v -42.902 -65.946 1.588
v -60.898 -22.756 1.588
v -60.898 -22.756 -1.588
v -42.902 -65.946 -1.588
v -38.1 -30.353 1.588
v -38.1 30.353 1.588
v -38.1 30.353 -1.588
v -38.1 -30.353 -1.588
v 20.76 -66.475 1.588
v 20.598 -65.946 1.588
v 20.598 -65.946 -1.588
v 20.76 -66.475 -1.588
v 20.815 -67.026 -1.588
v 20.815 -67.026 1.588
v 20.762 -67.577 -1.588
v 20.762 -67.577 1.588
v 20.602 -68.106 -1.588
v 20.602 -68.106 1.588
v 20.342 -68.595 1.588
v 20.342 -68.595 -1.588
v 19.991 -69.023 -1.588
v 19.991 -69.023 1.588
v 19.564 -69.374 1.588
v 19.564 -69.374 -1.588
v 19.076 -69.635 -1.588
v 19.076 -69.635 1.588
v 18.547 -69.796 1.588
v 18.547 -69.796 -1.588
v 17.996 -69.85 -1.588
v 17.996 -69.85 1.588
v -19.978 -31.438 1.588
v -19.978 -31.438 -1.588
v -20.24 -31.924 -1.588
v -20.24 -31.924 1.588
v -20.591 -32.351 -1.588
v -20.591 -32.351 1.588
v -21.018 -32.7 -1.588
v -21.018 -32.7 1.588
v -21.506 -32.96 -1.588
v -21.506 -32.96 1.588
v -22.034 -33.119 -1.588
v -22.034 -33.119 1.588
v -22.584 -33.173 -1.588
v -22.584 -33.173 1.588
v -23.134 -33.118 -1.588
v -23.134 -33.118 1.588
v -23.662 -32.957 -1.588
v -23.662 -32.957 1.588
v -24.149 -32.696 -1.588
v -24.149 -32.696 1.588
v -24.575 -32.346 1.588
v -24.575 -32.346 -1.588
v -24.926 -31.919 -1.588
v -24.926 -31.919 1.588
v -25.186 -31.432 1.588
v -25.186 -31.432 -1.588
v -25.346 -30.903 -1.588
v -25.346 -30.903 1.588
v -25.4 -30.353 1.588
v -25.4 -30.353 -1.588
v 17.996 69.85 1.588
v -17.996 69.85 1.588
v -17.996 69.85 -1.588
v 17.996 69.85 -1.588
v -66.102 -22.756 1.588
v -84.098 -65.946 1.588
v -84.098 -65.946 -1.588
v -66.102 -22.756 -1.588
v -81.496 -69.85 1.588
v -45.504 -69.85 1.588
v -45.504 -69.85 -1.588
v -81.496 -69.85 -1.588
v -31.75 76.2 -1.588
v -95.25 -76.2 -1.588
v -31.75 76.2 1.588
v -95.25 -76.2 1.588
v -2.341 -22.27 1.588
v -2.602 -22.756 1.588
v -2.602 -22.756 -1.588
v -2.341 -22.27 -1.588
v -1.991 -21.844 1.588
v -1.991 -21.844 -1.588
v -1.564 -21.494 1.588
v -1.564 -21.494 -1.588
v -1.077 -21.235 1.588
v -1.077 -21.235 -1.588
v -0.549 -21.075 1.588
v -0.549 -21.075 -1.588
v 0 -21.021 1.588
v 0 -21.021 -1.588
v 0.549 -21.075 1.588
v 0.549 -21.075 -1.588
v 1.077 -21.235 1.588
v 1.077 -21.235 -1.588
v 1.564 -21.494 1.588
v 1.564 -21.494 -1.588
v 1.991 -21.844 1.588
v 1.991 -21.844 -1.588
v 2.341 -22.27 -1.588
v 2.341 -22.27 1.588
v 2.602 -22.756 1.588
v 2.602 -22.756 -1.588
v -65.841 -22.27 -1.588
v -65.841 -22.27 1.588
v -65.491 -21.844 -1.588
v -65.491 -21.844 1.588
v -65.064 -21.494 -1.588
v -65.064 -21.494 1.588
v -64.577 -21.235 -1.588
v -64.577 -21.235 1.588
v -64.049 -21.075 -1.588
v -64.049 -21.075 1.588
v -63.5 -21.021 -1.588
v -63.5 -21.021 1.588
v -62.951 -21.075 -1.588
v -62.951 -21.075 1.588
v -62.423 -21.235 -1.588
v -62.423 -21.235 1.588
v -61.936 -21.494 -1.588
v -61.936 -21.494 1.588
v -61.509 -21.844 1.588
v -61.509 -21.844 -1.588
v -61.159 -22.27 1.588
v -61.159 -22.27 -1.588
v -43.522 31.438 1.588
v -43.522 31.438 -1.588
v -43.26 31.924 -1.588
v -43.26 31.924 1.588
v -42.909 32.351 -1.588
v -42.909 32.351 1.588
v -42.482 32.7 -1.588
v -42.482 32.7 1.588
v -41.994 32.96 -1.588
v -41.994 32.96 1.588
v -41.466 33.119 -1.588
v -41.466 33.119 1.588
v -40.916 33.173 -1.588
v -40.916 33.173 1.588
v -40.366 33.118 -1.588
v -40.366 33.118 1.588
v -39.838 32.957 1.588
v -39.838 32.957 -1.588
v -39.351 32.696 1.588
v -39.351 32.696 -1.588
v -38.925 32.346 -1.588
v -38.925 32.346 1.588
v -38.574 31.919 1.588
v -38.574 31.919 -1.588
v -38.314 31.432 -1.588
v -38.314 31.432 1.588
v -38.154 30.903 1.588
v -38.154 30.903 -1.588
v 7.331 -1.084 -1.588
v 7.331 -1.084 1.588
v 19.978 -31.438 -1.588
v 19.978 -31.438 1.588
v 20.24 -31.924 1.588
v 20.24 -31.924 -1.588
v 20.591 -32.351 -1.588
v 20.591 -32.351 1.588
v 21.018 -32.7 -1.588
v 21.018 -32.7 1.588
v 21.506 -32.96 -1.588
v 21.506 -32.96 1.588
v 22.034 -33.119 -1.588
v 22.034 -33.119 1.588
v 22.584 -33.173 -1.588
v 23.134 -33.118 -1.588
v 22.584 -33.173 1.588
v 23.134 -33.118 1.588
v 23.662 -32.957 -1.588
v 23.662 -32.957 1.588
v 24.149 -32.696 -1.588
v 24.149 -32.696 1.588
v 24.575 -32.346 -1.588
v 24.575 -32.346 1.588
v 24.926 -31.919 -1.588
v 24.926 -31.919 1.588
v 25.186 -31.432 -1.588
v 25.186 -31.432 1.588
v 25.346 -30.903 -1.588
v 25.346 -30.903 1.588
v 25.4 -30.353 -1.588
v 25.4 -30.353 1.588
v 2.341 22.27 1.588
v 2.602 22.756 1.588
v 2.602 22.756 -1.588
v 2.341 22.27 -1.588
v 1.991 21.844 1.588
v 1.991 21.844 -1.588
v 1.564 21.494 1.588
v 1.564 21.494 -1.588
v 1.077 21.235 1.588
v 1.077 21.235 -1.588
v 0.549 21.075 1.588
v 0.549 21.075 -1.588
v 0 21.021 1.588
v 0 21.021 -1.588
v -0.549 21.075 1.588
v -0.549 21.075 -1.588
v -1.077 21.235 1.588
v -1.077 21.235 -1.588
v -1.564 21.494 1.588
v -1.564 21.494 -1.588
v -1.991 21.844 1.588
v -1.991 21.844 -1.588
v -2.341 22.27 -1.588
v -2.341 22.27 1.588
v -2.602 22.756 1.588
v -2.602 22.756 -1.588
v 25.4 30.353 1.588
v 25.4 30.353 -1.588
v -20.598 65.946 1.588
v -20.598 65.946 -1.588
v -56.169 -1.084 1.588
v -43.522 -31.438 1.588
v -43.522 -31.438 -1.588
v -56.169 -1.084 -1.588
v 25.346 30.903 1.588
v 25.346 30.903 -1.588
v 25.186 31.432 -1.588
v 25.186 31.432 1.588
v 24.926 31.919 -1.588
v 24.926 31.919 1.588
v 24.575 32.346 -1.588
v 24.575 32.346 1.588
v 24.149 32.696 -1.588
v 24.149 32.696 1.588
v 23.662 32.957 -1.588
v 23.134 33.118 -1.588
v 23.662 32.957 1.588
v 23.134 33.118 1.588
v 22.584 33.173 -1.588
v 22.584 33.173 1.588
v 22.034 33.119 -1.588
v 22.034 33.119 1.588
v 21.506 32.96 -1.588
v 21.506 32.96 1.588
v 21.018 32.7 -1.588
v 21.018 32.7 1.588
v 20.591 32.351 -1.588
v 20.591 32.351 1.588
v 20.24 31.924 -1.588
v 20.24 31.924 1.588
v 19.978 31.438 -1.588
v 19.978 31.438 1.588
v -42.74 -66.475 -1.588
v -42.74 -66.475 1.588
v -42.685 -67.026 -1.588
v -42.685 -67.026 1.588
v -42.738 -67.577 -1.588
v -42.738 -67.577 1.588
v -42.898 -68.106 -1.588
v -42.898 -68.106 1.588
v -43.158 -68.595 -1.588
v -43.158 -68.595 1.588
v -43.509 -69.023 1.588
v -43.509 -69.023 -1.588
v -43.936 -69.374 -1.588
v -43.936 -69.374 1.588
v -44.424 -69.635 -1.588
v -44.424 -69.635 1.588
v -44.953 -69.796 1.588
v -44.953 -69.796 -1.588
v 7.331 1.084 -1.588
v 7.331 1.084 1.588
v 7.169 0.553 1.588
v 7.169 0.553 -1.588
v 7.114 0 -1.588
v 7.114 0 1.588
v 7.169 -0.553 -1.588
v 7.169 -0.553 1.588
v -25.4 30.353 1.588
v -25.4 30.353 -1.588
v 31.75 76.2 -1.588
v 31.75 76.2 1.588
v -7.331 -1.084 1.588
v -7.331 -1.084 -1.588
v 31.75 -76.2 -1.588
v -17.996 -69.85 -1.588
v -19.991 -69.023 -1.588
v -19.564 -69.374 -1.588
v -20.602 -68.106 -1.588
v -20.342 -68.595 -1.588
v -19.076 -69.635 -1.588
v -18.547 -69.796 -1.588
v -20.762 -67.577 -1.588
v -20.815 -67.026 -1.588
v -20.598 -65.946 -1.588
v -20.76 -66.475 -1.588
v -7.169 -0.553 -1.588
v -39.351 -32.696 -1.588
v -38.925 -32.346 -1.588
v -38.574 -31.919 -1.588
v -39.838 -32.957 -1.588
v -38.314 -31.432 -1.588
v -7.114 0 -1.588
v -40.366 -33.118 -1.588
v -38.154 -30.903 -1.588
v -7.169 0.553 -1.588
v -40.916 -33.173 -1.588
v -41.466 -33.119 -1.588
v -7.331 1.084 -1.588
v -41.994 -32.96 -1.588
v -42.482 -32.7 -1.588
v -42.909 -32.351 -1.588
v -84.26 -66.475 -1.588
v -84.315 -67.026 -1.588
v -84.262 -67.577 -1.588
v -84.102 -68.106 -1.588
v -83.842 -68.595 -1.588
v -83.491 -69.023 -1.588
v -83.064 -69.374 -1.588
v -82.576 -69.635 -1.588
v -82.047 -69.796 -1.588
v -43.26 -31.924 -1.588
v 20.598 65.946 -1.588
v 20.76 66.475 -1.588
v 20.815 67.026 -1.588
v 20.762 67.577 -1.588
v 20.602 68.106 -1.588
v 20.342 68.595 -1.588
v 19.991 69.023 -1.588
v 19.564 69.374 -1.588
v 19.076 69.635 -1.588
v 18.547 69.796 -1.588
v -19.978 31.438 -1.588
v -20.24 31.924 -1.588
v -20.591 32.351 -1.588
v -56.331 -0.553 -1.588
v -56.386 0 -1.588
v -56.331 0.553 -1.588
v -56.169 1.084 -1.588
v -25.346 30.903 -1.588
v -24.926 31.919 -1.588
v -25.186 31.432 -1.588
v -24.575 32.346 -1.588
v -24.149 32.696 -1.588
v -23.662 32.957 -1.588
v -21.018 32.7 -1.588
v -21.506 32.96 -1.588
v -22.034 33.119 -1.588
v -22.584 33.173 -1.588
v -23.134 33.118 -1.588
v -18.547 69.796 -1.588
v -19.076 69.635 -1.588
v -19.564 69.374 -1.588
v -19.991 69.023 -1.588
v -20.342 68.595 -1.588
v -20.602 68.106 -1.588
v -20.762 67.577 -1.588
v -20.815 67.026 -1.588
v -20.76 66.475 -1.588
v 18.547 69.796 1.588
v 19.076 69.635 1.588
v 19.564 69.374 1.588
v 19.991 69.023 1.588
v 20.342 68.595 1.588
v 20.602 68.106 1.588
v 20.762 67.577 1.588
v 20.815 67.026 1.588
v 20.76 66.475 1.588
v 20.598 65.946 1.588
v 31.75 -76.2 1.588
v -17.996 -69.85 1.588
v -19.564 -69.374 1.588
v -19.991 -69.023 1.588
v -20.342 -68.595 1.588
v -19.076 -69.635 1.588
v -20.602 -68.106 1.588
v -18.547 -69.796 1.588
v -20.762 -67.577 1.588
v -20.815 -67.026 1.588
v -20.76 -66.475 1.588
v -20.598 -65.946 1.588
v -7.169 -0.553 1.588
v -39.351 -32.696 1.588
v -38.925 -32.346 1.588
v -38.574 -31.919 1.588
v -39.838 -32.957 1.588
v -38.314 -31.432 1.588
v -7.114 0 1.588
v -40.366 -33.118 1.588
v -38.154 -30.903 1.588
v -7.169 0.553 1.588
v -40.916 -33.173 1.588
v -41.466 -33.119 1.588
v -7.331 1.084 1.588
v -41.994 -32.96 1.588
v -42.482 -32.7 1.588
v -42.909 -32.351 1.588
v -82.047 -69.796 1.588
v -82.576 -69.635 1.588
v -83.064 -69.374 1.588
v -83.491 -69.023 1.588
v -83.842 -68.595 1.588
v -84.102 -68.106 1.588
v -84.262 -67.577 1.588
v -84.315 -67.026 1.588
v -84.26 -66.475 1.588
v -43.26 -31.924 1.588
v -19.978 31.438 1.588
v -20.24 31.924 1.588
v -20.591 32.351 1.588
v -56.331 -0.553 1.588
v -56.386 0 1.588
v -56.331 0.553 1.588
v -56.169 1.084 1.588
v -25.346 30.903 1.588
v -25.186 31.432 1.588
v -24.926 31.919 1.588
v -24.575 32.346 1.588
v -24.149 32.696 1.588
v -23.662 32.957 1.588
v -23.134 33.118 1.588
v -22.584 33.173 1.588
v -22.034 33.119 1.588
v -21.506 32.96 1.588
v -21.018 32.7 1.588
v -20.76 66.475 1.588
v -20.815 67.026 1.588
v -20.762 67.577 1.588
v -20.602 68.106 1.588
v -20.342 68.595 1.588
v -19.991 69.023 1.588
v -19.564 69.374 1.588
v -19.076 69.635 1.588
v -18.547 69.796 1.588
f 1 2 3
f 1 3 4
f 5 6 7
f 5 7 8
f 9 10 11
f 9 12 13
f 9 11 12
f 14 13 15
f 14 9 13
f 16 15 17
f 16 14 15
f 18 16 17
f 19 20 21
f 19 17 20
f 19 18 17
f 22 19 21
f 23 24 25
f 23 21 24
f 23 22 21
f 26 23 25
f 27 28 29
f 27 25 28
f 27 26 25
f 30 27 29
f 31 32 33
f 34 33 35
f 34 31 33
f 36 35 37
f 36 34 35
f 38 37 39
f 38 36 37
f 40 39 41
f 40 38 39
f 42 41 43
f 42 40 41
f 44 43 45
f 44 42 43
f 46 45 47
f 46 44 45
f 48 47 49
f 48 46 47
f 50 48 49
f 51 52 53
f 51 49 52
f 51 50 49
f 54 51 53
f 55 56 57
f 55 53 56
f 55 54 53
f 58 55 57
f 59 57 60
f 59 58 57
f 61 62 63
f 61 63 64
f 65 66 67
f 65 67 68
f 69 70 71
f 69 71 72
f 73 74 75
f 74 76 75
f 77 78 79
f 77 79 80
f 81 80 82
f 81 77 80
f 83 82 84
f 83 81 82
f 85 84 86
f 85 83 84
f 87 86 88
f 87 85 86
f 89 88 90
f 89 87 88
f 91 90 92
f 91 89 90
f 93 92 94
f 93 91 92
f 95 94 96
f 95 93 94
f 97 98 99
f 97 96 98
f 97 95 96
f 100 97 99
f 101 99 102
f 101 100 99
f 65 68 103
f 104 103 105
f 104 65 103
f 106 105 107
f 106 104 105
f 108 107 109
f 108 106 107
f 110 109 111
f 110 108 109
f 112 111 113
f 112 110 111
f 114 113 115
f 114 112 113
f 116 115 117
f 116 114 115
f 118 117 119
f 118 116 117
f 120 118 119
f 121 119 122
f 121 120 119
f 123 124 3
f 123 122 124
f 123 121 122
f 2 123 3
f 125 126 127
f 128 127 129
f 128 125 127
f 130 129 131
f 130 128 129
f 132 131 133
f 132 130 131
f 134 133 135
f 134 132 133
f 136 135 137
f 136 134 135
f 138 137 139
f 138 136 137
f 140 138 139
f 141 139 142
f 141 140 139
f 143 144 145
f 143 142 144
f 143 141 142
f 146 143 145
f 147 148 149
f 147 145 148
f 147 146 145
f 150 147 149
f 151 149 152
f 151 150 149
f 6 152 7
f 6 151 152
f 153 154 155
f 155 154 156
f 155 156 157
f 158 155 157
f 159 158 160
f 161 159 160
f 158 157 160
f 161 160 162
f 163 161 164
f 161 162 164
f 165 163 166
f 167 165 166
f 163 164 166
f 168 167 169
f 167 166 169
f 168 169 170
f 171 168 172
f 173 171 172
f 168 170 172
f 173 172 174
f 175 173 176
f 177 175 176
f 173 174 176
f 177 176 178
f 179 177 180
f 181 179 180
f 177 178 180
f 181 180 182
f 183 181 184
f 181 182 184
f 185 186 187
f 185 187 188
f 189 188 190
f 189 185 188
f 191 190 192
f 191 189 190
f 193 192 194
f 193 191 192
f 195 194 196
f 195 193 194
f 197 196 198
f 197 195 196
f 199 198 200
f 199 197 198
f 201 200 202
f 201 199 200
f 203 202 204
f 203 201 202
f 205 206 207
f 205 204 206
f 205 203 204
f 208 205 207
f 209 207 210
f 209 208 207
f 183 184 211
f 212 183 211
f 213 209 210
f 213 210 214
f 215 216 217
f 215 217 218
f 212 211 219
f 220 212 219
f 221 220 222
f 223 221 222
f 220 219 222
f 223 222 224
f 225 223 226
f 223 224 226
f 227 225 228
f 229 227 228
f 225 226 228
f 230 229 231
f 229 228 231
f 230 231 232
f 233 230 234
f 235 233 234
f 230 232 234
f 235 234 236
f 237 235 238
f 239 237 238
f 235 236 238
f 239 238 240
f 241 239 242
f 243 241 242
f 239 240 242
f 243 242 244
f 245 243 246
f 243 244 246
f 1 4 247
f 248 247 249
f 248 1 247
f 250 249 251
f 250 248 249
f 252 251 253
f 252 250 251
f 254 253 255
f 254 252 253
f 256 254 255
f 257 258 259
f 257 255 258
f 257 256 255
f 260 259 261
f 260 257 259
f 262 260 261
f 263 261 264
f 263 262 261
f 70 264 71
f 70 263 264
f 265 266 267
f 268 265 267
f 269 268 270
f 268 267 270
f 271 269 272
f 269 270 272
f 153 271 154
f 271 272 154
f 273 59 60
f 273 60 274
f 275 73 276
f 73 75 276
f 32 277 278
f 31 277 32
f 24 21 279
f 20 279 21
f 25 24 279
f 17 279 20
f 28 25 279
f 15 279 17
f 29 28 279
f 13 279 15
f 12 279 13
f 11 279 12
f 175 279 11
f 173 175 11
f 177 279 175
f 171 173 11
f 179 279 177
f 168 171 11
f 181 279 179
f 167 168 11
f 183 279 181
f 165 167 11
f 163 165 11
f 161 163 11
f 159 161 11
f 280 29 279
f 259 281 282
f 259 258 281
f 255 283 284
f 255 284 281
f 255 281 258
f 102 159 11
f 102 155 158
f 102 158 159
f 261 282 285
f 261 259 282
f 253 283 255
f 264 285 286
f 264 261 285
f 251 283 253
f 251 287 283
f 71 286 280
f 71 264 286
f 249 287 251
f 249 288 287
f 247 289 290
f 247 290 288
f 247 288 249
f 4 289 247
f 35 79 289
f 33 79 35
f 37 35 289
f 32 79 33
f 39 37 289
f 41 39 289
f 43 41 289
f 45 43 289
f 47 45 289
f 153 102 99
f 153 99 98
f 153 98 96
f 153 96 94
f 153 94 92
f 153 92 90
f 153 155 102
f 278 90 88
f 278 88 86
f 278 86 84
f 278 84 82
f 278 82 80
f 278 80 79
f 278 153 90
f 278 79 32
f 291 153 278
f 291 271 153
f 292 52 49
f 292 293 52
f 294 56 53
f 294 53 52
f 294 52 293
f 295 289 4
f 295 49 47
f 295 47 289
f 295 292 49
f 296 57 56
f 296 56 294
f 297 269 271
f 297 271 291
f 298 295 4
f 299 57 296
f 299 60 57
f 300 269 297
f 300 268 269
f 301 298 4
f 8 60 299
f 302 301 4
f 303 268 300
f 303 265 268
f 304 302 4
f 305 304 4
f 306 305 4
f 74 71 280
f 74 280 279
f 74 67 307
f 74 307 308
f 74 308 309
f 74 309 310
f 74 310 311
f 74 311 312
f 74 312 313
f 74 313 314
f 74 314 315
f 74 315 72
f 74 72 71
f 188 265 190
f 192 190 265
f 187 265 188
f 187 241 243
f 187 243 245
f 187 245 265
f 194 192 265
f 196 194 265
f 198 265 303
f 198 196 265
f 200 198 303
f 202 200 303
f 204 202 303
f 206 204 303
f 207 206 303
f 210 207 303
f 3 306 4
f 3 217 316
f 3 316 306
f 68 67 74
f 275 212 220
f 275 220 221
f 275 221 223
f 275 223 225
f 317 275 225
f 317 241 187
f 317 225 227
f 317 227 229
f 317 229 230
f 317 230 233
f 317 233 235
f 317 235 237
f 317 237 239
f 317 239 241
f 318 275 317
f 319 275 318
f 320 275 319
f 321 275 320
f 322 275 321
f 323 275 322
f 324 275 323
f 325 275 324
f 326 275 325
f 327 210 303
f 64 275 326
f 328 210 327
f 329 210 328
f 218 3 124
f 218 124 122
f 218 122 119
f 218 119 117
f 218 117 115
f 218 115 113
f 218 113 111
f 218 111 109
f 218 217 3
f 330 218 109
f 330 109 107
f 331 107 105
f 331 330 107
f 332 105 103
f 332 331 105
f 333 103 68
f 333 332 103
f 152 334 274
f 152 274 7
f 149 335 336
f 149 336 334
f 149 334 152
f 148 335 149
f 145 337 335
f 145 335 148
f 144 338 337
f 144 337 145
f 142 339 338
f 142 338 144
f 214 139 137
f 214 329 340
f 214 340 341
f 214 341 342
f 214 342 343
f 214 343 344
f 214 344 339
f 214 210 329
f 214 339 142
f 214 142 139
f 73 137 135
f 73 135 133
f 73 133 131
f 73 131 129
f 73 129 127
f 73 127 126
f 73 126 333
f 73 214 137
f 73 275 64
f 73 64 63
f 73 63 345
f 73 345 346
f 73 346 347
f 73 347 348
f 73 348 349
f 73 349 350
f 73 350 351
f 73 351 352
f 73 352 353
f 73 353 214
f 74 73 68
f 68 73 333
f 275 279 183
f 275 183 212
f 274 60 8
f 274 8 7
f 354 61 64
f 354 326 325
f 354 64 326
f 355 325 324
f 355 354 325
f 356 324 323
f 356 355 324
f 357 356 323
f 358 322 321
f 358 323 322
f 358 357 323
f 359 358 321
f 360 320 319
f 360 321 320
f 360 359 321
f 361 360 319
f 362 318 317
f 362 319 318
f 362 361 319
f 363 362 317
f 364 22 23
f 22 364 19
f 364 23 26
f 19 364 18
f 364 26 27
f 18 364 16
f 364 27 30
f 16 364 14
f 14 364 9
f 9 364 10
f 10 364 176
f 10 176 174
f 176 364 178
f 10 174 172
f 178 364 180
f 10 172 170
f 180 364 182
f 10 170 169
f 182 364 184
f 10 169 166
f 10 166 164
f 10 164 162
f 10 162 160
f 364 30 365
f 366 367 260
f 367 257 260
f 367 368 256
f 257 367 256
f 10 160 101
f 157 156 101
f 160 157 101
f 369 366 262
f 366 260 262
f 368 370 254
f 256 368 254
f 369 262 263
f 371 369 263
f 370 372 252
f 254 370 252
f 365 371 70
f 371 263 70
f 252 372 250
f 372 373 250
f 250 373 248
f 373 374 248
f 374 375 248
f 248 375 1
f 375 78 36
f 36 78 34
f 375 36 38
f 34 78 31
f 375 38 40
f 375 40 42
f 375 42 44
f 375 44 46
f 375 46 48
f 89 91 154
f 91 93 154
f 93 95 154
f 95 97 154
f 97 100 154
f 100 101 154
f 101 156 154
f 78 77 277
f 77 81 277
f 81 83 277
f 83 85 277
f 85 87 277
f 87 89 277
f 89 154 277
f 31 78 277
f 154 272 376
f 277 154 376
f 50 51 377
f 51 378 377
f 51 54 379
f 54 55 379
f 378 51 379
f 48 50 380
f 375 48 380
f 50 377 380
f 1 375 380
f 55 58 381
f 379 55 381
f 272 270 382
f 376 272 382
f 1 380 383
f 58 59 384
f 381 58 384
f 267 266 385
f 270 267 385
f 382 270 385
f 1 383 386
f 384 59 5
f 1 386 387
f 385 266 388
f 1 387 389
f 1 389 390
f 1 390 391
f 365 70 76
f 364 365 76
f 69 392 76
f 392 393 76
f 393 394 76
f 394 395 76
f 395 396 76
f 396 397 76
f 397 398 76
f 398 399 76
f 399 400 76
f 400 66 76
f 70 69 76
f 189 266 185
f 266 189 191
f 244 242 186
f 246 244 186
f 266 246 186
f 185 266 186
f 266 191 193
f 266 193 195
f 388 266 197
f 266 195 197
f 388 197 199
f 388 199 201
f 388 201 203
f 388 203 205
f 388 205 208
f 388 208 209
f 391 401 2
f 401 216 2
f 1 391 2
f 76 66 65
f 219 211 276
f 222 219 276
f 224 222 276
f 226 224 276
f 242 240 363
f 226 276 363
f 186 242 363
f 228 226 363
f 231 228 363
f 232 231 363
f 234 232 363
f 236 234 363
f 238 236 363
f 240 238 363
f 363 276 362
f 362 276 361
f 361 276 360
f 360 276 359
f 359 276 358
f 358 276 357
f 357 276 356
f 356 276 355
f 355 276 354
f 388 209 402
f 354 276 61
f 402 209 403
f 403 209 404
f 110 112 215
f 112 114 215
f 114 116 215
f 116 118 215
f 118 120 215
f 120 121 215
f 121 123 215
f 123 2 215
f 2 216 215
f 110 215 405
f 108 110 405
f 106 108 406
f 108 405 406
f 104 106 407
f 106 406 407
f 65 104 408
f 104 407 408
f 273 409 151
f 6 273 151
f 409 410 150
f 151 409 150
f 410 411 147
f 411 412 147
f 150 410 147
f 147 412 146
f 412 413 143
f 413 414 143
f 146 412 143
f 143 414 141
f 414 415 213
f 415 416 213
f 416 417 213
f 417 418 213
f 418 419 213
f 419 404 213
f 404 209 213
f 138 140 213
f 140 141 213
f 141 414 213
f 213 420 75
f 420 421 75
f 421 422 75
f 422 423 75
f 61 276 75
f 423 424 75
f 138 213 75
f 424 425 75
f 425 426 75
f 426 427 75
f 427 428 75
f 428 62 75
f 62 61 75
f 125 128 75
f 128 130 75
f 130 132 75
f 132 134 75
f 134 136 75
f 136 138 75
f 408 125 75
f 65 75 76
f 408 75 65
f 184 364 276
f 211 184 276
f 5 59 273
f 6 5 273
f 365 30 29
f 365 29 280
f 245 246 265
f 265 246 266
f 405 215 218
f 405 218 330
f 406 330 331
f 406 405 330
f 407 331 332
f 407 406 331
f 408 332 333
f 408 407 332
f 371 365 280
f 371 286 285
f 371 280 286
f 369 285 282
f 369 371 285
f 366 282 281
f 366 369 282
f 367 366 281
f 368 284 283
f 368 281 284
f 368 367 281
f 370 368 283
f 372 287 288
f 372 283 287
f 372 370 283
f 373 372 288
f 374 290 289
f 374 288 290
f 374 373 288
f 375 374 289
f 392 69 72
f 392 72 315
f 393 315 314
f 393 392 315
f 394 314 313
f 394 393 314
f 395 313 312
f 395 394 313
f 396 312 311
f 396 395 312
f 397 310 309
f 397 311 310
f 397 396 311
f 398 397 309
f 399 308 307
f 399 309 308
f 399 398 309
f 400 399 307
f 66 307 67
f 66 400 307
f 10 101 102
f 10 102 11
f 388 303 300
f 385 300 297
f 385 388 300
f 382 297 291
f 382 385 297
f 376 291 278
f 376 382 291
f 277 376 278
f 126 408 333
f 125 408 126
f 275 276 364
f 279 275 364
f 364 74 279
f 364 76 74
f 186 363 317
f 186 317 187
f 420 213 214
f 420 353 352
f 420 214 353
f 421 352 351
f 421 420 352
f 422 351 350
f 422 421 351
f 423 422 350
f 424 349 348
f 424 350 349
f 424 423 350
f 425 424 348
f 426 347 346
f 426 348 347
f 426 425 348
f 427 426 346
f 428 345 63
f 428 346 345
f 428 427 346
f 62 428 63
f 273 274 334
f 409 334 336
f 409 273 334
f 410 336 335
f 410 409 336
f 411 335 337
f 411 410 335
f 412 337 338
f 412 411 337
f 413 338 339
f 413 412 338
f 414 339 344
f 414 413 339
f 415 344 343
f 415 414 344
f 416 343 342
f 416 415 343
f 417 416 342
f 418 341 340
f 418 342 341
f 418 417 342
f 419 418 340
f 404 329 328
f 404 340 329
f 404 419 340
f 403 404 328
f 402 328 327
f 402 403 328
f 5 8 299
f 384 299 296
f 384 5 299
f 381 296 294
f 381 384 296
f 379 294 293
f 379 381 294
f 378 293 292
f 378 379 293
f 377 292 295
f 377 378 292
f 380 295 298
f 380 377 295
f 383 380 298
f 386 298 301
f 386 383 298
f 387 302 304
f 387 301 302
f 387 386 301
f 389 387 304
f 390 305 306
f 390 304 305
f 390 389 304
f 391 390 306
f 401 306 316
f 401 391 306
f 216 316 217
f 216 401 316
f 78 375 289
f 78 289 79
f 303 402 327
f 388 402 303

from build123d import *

# Parameters (mm, degrees)
BOSS_EXTRUDE1_DEPTH = 1.5875
CUT_EXTRUDE1_DEPTH  = 5.08


with BuildPart() as part:
    # Sketch2 → Boss-Extrude1 (new body, symmetric)
    with BuildSketch(Plane.XY):
        Polygon((-31.75, -76.2), (-95.25, -76.2), (-31.75, 76.2), (31.75, 76.2), (31.75, -76.2), align=None)
    extrude(amount=BOSS_EXTRUDE1_DEPTH, both=True)

    # Sketch3 → Cut-Extrude1 (cut)
    with BuildSketch(Plane.XY.offset(1.5875)):
        with BuildLine():
            Line((-60.897552188, -22.755874748), (-42.901529882, -65.946328282))
            ThreePointArc((-42.901529882, -65.946328282), (-43.158162937, -68.594558042), (-45.503977694, -69.85))
            Line((-45.503977694, -69.85), (-81.496022306, -69.85))
            ThreePointArc((-81.496022306, -69.85), (-83.841837063, -68.594558042), (-84.098470118, -65.946328282))
            Line((-84.098470118, -65.946328282), (-66.102447812, -22.755874748))
            ThreePointArc((-66.102447812, -22.755874748), (-63.5, -21.020909541), (-60.897552188, -22.755874748))
        make_face()
        with BuildLine():
            ThreePointArc((-25.4, 30.353407686), (-23.133595378, 33.117976889), (-19.978233725, 31.437760941))
            Line((-19.978233725, 31.437760941), (-7.330980523, 1.084353255))
            ThreePointArc((-7.330980523, 1.084353255), (-7.114109872, 0), (-7.330980523, -1.084353255))
            Line((-7.330980523, -1.084353255), (-19.978233725, -31.437760941))
            ThreePointArc((-19.978233725, -31.437760941), (-23.133595378, -33.117976889), (-25.4, -30.353407686))
            Line((-25.4, -30.353407686), (-25.4, 30.353407686))
        make_face()
        with BuildLine():
            ThreePointArc((-20.598470118, 65.946328282), (-20.341837063, 68.594558042), (-17.996022306, 69.85))
            Line((-17.996022306, 69.85), (17.996022306, 69.85))
            ThreePointArc((17.996022306, 69.85), (20.341837063, 68.594558042), (20.598470118, 65.946328282))
            Line((20.598470118, 65.946328282), (2.602447812, 22.755874748))
            ThreePointArc((2.602447812, 22.755874748), (0, 21.020909541), (-2.602447812, 22.755874748))
            Line((-2.602447812, 22.755874748), (-20.598470118, 65.946328282))
        make_face()
        with BuildLine():
            ThreePointArc((-2.602447812, -22.755874748), (0, -21.020909541), (2.602447812, -22.755874748))
            Line((2.602447812, -22.755874748), (20.598470118, -65.946328282))
            ThreePointArc((20.598470118, -65.946328282), (20.341837063, -68.594558042), (17.996022306, -69.85))
            Line((17.996022306, -69.85), (-17.996022306, -69.85))
            ThreePointArc((-17.996022306, -69.85), (-20.341837063, -68.594558042), (-20.598470118, -65.946328282))
            Line((-20.598470118, -65.946328282), (-2.602447812, -22.755874748))
        make_face()
        with BuildLine():
            Line((-38.1, 30.353407686), (-38.1, -30.353407686))
            ThreePointArc((-38.1, -30.353407686), (-40.366404622, -33.117976889), (-43.521766275, -31.437760941))
            Line((-43.521766275, -31.437760941), (-56.169019477, -1.084353255))
            ThreePointArc((-56.169019477, -1.084353255), (-56.385890128, 0), (-56.169019477, 1.084353255))
            Line((-56.169019477, 1.084353255), (-43.521766275, 31.437760941))
            ThreePointArc((-43.521766275, 31.437760941), (-40.366404622, 33.117976889), (-38.1, 30.353407686))
        make_face()
        with BuildLine():
            Line((25.4, -30.353407686), (25.4, 30.353407686))
            ThreePointArc((25.4, 30.353407686), (23.133595378, 33.117976889), (19.978233725, 31.437760941))
            Line((19.978233725, 31.437760941), (7.330980523, 1.084353255))
            ThreePointArc((7.330980523, 1.084353255), (7.114109872, 0), (7.330980523, -1.084353255))
            Line((7.330980523, -1.084353255), (19.978233725, -31.437760941))
            ThreePointArc((19.978233725, -31.437760941), (23.133595378, -33.117976889), (25.4, -30.353407686))
        make_face()
    extrude(amount=-CUT_EXTRUDE1_DEPTH, mode=Mode.SUBTRACT)


solid = part.part
